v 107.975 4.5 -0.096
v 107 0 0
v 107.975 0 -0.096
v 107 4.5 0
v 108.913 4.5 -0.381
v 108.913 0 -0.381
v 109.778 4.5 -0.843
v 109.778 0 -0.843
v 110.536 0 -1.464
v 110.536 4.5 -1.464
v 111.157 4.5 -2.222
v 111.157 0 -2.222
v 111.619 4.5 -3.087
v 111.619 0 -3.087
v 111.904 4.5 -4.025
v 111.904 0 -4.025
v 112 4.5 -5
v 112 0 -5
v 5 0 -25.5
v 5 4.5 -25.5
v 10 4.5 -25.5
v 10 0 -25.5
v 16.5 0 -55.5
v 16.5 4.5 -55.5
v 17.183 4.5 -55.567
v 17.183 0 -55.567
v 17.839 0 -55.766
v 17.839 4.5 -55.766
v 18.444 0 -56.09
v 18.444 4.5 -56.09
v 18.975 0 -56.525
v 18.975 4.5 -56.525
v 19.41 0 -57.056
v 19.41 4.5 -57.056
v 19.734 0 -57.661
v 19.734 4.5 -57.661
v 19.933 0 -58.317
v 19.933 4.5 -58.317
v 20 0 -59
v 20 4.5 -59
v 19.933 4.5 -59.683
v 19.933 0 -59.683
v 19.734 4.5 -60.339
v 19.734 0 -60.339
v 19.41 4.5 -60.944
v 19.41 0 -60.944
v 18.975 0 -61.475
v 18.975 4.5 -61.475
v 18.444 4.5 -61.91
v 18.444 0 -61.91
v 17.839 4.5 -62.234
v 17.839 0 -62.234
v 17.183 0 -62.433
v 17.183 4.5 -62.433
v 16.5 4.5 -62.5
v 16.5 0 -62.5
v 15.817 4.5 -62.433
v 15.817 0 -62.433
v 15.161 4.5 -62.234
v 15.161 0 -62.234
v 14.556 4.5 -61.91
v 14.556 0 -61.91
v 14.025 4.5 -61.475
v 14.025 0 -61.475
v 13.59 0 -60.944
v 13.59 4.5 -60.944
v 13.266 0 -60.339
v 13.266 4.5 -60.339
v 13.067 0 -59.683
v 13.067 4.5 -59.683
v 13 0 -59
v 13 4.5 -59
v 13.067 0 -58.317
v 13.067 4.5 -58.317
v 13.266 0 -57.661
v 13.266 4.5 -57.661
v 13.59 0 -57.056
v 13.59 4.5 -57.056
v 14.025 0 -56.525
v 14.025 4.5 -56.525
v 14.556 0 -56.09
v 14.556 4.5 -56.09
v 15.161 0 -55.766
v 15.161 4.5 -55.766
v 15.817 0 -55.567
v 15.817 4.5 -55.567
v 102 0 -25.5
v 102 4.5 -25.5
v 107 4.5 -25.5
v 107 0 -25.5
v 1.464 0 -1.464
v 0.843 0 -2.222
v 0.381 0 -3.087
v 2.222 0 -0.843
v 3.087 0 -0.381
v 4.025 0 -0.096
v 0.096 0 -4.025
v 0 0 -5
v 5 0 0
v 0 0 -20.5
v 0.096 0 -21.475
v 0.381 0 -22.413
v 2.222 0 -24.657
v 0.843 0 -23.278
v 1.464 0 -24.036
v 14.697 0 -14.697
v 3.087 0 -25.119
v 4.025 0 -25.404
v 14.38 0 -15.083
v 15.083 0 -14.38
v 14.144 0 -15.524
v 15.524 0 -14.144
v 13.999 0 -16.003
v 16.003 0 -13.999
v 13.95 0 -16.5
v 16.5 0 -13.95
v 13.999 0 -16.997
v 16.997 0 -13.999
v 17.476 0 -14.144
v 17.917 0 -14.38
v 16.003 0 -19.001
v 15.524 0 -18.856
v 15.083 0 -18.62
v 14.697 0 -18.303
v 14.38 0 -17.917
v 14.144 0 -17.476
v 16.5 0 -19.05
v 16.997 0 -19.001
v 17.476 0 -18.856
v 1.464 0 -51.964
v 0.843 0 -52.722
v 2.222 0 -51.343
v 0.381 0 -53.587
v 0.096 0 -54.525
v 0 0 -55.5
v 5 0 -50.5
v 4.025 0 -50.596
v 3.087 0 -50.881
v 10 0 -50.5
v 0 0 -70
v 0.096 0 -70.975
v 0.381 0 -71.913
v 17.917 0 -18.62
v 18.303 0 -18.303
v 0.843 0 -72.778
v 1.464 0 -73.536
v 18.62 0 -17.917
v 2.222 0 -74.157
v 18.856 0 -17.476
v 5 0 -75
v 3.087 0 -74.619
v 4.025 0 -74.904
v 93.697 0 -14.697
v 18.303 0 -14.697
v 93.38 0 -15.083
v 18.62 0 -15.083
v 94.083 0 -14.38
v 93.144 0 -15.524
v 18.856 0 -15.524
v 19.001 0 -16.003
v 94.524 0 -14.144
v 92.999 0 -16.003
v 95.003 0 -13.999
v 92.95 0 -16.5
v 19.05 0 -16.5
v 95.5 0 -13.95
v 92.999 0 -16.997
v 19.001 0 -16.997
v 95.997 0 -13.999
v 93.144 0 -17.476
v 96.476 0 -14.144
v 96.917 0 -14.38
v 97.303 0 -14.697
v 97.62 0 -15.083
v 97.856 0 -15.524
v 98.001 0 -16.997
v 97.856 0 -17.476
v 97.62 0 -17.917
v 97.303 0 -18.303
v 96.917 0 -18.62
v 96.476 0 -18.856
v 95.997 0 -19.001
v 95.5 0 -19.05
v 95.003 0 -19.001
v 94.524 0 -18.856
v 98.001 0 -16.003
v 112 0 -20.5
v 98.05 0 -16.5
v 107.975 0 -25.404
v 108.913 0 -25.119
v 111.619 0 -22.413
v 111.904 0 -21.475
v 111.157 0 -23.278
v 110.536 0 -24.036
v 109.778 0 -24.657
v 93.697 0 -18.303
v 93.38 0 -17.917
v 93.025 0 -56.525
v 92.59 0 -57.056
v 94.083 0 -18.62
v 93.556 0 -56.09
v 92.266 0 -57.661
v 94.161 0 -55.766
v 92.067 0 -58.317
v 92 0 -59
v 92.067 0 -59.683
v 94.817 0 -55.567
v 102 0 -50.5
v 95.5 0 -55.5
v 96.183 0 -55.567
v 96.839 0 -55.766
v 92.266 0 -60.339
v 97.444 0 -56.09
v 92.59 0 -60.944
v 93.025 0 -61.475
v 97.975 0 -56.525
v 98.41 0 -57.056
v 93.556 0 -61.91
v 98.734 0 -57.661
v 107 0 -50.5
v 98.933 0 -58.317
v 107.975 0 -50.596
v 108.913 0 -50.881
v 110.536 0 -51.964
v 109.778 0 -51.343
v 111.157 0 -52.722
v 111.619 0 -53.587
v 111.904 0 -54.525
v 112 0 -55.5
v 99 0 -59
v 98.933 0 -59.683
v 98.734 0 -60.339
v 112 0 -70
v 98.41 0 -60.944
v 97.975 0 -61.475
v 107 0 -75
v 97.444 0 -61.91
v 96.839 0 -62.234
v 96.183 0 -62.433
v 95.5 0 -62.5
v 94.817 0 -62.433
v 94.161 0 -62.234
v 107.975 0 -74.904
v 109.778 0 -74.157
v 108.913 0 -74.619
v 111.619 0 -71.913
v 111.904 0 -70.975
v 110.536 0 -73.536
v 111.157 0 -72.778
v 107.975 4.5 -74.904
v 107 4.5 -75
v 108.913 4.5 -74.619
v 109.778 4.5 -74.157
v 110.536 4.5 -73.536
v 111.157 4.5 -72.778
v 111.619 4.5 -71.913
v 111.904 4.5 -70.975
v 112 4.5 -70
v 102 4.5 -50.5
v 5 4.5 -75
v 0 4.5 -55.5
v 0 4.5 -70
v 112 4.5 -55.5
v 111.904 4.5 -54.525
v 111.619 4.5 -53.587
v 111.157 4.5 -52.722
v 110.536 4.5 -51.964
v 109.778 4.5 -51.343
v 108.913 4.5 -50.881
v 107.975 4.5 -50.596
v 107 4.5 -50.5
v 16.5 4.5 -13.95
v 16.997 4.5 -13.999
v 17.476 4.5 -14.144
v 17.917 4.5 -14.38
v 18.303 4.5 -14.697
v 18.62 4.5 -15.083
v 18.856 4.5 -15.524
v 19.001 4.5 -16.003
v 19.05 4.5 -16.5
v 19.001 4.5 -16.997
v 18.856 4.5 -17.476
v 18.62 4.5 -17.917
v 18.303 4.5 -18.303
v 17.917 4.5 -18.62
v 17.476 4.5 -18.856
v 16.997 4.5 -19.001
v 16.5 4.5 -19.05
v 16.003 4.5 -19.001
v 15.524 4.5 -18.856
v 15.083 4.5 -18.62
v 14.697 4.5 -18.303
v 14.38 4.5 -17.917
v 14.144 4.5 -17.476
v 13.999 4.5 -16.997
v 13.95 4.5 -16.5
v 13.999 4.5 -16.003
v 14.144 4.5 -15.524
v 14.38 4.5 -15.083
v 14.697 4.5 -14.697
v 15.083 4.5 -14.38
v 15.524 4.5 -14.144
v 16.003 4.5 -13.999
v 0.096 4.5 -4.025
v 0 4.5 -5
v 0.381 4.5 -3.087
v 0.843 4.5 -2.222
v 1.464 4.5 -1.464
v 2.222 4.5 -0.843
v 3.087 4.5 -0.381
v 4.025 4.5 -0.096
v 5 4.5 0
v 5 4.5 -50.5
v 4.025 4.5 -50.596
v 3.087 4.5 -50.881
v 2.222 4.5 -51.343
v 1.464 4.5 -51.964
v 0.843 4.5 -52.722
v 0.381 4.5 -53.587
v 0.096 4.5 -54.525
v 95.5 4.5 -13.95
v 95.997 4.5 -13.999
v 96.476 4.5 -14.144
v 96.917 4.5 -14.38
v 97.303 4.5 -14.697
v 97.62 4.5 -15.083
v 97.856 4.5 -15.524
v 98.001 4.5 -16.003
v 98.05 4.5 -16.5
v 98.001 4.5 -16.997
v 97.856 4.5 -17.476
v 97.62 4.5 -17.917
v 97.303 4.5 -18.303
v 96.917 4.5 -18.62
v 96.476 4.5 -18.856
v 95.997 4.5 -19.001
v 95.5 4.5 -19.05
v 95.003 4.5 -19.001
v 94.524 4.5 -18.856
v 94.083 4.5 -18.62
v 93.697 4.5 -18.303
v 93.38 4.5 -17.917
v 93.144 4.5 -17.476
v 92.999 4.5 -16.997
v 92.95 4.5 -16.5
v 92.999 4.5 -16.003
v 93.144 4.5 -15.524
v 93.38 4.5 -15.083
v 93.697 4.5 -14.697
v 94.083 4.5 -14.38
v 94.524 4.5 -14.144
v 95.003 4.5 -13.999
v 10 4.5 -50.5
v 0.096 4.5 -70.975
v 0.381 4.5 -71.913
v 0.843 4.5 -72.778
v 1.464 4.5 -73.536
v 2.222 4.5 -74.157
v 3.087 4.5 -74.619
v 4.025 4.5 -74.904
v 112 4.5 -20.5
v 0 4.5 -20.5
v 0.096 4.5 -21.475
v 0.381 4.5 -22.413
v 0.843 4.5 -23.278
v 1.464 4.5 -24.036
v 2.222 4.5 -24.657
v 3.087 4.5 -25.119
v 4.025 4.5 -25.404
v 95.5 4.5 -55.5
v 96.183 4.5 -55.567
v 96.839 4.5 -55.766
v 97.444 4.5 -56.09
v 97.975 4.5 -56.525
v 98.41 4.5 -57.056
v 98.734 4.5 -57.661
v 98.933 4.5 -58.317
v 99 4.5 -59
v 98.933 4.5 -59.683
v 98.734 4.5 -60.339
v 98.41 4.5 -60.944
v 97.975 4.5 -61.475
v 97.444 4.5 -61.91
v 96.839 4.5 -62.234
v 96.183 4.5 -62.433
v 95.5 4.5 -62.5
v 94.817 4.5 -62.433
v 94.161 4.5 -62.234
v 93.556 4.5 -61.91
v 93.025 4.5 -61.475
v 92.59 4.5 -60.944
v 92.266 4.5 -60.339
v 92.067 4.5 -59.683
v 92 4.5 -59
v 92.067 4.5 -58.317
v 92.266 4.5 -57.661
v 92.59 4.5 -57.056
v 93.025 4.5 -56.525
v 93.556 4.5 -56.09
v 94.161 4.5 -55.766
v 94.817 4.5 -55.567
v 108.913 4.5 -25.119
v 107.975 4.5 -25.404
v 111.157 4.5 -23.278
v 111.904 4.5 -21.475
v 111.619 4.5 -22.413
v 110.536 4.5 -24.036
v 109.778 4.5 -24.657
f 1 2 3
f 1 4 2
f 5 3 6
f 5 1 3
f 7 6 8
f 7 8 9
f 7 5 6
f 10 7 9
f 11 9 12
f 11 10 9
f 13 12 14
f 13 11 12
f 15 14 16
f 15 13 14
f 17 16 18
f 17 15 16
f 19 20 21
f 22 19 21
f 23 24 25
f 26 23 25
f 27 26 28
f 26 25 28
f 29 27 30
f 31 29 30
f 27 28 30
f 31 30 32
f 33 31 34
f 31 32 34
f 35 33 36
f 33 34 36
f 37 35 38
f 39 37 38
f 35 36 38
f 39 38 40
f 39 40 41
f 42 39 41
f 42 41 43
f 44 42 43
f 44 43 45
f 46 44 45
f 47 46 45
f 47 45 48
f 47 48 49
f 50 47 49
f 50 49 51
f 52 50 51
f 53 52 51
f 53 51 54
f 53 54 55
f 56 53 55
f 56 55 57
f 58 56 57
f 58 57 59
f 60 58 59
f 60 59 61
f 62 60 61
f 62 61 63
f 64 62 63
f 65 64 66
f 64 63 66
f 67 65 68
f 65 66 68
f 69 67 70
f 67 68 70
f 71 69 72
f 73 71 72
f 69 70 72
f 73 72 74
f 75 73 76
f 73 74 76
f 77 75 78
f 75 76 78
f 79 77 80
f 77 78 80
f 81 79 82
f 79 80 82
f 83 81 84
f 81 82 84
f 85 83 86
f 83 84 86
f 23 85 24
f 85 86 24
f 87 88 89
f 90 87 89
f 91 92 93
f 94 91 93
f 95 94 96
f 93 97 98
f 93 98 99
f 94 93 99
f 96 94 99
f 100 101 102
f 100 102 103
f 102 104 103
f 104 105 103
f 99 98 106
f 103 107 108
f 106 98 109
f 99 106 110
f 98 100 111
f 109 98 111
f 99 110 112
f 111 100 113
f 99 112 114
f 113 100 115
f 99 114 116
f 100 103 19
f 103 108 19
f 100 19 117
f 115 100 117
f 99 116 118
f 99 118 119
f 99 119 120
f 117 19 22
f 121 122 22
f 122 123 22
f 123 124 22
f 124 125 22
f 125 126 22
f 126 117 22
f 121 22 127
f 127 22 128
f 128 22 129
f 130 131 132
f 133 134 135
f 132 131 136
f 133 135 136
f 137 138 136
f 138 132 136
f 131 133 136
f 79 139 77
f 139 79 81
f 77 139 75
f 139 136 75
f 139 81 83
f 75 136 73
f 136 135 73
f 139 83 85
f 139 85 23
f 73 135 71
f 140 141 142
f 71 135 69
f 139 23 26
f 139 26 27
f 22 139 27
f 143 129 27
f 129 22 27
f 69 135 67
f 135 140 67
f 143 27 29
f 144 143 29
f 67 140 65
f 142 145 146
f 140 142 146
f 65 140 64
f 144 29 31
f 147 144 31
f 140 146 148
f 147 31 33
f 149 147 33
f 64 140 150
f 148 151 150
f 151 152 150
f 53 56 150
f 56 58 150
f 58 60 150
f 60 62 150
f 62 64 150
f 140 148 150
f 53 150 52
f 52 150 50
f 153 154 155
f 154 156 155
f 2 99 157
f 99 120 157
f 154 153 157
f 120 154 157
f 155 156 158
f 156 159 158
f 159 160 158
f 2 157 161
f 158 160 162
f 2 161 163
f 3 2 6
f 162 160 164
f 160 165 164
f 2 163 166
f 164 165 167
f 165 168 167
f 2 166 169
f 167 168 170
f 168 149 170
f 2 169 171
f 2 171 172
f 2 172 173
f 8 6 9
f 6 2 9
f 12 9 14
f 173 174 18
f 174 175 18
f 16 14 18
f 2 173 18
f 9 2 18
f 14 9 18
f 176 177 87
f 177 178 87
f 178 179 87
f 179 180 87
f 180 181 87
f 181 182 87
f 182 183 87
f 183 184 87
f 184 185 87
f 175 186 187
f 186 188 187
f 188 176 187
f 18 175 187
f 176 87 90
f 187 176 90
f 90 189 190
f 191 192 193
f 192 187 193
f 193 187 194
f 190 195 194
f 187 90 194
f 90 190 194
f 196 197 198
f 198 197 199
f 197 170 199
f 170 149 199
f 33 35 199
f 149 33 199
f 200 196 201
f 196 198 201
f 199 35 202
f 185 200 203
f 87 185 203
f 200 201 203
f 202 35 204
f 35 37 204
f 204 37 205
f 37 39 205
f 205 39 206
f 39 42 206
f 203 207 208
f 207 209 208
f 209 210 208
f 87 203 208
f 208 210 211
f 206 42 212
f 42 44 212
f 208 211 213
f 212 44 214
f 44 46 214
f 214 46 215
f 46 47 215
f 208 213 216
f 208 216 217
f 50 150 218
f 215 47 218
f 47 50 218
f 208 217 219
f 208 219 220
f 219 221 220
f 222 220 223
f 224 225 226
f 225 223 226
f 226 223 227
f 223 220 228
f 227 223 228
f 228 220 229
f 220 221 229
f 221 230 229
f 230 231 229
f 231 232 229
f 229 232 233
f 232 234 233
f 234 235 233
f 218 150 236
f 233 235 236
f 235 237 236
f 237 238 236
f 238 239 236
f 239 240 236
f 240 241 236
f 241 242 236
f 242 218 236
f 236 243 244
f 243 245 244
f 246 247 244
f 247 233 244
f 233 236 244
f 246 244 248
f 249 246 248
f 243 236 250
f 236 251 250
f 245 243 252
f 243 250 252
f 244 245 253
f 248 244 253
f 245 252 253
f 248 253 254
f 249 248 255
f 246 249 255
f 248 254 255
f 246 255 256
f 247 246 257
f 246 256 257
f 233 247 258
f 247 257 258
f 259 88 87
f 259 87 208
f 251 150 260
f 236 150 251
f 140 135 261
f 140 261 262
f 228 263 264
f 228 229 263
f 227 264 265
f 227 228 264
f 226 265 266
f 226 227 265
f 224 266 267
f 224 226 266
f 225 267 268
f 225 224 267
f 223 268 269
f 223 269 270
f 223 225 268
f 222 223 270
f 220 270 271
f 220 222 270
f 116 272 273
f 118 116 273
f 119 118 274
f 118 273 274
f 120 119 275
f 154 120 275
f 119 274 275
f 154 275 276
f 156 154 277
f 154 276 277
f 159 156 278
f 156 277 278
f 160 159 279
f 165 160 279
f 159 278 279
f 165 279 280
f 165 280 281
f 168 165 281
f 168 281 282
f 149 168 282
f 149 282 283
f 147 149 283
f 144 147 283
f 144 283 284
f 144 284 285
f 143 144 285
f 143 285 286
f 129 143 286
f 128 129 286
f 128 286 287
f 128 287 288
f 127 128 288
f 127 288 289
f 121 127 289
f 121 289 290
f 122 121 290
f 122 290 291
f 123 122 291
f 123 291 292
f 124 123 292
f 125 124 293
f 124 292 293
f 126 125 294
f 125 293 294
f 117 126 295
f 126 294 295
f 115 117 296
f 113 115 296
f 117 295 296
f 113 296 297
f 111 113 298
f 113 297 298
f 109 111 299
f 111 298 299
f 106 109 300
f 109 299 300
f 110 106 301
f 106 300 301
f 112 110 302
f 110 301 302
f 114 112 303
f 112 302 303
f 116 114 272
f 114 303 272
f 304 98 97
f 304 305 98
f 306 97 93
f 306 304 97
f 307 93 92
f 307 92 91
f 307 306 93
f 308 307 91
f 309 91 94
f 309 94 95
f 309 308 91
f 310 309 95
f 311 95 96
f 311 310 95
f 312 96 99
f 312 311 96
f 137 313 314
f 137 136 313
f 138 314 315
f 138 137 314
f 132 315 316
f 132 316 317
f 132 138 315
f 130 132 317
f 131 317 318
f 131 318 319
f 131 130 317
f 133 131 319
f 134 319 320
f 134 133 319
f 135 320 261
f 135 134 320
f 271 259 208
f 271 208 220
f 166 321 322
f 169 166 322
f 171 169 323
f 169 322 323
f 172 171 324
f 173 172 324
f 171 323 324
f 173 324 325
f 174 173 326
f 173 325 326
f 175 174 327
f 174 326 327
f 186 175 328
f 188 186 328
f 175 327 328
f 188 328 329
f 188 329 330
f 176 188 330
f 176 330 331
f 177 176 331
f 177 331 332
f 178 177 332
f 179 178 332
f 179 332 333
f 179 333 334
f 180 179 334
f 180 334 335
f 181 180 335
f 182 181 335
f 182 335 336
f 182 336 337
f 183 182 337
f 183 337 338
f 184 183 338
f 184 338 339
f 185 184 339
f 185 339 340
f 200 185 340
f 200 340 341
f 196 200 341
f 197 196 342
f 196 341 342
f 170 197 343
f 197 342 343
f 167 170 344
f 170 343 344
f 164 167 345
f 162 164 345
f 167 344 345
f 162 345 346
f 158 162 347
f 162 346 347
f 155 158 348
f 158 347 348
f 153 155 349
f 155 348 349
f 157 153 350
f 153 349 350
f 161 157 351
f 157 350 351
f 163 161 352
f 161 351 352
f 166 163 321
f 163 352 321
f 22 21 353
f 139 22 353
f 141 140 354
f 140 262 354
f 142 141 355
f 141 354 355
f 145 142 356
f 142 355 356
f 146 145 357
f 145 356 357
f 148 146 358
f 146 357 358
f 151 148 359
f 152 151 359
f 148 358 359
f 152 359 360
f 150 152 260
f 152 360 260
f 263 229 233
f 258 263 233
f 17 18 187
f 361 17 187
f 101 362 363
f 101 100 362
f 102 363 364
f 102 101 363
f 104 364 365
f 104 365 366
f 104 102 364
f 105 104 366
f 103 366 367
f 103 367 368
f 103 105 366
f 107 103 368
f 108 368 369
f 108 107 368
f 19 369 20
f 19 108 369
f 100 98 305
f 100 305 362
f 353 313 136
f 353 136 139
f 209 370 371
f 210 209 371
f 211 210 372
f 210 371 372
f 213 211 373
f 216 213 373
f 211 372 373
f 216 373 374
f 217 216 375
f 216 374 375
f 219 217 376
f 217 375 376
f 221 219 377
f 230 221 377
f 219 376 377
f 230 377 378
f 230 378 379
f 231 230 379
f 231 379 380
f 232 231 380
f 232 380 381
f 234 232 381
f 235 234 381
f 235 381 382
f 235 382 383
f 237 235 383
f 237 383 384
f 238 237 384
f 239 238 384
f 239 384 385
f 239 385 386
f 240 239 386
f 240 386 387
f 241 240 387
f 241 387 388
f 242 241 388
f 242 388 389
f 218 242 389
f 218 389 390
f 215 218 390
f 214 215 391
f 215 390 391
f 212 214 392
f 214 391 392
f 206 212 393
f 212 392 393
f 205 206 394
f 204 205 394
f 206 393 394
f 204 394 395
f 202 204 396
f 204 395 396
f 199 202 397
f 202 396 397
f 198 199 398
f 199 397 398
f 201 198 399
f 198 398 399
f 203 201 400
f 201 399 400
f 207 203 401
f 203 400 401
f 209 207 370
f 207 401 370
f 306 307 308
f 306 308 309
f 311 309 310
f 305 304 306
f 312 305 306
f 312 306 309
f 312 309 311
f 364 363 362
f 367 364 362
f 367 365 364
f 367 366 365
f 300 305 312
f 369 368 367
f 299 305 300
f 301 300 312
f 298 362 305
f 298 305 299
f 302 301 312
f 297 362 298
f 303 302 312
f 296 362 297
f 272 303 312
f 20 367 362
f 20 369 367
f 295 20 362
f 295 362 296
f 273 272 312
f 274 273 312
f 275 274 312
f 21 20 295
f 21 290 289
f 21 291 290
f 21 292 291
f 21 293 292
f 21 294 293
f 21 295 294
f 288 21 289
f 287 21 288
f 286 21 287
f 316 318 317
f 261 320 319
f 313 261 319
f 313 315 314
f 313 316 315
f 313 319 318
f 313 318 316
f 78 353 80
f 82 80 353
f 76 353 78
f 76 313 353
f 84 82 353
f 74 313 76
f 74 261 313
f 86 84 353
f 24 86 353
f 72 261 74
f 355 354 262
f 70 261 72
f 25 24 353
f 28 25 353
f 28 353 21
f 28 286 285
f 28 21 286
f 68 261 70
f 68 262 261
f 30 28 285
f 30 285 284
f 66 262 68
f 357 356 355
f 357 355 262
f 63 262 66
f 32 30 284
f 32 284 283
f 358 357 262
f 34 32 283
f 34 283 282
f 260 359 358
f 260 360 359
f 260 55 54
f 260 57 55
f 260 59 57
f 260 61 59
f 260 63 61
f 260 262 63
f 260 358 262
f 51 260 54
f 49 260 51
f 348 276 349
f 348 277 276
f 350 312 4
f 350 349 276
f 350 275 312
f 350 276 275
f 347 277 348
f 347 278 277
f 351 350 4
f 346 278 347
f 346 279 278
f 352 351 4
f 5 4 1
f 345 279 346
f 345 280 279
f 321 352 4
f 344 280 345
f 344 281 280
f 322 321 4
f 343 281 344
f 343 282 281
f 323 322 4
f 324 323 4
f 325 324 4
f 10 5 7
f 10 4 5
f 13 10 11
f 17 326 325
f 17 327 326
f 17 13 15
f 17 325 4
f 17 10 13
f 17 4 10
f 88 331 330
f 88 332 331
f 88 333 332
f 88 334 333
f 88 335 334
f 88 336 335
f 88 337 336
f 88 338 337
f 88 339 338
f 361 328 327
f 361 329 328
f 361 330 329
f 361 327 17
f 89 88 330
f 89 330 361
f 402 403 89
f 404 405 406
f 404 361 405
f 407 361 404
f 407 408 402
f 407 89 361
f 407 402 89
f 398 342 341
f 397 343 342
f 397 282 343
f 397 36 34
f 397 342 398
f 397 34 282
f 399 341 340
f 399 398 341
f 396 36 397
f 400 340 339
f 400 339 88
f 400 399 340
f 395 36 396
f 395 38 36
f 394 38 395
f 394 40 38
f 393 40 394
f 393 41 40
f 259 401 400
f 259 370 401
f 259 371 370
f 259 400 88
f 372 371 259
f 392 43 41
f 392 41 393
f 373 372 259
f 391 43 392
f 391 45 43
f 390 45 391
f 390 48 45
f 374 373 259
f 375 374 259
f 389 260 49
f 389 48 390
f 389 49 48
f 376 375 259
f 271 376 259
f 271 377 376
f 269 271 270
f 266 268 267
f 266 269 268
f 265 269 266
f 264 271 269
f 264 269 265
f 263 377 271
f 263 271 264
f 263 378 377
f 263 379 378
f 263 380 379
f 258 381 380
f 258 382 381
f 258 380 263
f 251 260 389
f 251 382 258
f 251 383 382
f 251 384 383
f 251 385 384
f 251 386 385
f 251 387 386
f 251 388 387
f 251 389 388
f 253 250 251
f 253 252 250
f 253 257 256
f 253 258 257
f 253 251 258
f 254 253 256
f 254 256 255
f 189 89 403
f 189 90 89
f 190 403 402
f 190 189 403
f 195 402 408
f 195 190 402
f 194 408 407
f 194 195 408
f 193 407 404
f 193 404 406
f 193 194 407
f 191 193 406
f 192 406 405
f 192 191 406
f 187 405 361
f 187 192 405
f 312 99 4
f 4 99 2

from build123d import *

# Parameters (mm, degrees)
SKETCH1_W           = 112
SKETCH1_H           = 75
BOSS_EXTRUDE1_DEPTH = 4.5
SKETCH2_R           = 2.55
SKETCH2_R_2         = 3.5
SKETCH2_W           = 10
SKETCH2_H           = 25
CUT_EXTRUDE1_DEPTH  = 135.867527597
FILLET1_R           = 5


with BuildPart() as part:
    # Sketch1 → Boss-Extrude1 (new body)
    with BuildSketch(Plane(origin=(0, 0, 0), x_dir=(1, 0, 0), z_dir=(0, 1, 0))):
        with Locations((56, 37.5)):
            Rectangle(SKETCH1_W, SKETCH1_H)
    extrude(amount=BOSS_EXTRUDE1_DEPTH)

    # Sketch2 → Cut-Extrude1 (cut, through all)
    with BuildSketch(Plane(origin=(0, 4.5, 0), x_dir=(1, 0, 0), z_dir=(0, 1, 0))):
        with Locations(Location((95.5, 16.5, 0), (0, 0, 270))):
            Circle(SKETCH2_R)
        with Locations(Location((16.5, 16.5, 0), (0, 0, 270))):
            Circle(SKETCH2_R)
        with Locations(Location((16.5, 59, 0), (0, 0, 270))):
            Circle(SKETCH2_R_2)
        with Locations(Location((95.5, 59, 0), (0, 0, 270))):
            Circle(SKETCH2_R_2)
        with Locations((5, 38)):
            Rectangle(SKETCH2_W, SKETCH2_H)
        with Locations((107, 38)):
            Rectangle(SKETCH2_W, SKETCH2_H)
    extrude(amount=-CUT_EXTRUDE1_DEPTH, mode=Mode.SUBTRACT)

    # Fillet1
    fillet1_edges = [part.edges().sort_by_distance(p)[0] for p in [
        (112, 2.25, -50.5),
        (112, 2.25, -25.5),
        (0, 2.25, -25.5),
        (0, 2.25, -50.5),
        (0, 2.25, -75),
        (112, 2.25, -75),
        (112, 2.25, 0),
        (0, 2.25, 0),
    ]]
    fillet(fillet1_edges, radius=FILLET1_R)


solid = part.part
